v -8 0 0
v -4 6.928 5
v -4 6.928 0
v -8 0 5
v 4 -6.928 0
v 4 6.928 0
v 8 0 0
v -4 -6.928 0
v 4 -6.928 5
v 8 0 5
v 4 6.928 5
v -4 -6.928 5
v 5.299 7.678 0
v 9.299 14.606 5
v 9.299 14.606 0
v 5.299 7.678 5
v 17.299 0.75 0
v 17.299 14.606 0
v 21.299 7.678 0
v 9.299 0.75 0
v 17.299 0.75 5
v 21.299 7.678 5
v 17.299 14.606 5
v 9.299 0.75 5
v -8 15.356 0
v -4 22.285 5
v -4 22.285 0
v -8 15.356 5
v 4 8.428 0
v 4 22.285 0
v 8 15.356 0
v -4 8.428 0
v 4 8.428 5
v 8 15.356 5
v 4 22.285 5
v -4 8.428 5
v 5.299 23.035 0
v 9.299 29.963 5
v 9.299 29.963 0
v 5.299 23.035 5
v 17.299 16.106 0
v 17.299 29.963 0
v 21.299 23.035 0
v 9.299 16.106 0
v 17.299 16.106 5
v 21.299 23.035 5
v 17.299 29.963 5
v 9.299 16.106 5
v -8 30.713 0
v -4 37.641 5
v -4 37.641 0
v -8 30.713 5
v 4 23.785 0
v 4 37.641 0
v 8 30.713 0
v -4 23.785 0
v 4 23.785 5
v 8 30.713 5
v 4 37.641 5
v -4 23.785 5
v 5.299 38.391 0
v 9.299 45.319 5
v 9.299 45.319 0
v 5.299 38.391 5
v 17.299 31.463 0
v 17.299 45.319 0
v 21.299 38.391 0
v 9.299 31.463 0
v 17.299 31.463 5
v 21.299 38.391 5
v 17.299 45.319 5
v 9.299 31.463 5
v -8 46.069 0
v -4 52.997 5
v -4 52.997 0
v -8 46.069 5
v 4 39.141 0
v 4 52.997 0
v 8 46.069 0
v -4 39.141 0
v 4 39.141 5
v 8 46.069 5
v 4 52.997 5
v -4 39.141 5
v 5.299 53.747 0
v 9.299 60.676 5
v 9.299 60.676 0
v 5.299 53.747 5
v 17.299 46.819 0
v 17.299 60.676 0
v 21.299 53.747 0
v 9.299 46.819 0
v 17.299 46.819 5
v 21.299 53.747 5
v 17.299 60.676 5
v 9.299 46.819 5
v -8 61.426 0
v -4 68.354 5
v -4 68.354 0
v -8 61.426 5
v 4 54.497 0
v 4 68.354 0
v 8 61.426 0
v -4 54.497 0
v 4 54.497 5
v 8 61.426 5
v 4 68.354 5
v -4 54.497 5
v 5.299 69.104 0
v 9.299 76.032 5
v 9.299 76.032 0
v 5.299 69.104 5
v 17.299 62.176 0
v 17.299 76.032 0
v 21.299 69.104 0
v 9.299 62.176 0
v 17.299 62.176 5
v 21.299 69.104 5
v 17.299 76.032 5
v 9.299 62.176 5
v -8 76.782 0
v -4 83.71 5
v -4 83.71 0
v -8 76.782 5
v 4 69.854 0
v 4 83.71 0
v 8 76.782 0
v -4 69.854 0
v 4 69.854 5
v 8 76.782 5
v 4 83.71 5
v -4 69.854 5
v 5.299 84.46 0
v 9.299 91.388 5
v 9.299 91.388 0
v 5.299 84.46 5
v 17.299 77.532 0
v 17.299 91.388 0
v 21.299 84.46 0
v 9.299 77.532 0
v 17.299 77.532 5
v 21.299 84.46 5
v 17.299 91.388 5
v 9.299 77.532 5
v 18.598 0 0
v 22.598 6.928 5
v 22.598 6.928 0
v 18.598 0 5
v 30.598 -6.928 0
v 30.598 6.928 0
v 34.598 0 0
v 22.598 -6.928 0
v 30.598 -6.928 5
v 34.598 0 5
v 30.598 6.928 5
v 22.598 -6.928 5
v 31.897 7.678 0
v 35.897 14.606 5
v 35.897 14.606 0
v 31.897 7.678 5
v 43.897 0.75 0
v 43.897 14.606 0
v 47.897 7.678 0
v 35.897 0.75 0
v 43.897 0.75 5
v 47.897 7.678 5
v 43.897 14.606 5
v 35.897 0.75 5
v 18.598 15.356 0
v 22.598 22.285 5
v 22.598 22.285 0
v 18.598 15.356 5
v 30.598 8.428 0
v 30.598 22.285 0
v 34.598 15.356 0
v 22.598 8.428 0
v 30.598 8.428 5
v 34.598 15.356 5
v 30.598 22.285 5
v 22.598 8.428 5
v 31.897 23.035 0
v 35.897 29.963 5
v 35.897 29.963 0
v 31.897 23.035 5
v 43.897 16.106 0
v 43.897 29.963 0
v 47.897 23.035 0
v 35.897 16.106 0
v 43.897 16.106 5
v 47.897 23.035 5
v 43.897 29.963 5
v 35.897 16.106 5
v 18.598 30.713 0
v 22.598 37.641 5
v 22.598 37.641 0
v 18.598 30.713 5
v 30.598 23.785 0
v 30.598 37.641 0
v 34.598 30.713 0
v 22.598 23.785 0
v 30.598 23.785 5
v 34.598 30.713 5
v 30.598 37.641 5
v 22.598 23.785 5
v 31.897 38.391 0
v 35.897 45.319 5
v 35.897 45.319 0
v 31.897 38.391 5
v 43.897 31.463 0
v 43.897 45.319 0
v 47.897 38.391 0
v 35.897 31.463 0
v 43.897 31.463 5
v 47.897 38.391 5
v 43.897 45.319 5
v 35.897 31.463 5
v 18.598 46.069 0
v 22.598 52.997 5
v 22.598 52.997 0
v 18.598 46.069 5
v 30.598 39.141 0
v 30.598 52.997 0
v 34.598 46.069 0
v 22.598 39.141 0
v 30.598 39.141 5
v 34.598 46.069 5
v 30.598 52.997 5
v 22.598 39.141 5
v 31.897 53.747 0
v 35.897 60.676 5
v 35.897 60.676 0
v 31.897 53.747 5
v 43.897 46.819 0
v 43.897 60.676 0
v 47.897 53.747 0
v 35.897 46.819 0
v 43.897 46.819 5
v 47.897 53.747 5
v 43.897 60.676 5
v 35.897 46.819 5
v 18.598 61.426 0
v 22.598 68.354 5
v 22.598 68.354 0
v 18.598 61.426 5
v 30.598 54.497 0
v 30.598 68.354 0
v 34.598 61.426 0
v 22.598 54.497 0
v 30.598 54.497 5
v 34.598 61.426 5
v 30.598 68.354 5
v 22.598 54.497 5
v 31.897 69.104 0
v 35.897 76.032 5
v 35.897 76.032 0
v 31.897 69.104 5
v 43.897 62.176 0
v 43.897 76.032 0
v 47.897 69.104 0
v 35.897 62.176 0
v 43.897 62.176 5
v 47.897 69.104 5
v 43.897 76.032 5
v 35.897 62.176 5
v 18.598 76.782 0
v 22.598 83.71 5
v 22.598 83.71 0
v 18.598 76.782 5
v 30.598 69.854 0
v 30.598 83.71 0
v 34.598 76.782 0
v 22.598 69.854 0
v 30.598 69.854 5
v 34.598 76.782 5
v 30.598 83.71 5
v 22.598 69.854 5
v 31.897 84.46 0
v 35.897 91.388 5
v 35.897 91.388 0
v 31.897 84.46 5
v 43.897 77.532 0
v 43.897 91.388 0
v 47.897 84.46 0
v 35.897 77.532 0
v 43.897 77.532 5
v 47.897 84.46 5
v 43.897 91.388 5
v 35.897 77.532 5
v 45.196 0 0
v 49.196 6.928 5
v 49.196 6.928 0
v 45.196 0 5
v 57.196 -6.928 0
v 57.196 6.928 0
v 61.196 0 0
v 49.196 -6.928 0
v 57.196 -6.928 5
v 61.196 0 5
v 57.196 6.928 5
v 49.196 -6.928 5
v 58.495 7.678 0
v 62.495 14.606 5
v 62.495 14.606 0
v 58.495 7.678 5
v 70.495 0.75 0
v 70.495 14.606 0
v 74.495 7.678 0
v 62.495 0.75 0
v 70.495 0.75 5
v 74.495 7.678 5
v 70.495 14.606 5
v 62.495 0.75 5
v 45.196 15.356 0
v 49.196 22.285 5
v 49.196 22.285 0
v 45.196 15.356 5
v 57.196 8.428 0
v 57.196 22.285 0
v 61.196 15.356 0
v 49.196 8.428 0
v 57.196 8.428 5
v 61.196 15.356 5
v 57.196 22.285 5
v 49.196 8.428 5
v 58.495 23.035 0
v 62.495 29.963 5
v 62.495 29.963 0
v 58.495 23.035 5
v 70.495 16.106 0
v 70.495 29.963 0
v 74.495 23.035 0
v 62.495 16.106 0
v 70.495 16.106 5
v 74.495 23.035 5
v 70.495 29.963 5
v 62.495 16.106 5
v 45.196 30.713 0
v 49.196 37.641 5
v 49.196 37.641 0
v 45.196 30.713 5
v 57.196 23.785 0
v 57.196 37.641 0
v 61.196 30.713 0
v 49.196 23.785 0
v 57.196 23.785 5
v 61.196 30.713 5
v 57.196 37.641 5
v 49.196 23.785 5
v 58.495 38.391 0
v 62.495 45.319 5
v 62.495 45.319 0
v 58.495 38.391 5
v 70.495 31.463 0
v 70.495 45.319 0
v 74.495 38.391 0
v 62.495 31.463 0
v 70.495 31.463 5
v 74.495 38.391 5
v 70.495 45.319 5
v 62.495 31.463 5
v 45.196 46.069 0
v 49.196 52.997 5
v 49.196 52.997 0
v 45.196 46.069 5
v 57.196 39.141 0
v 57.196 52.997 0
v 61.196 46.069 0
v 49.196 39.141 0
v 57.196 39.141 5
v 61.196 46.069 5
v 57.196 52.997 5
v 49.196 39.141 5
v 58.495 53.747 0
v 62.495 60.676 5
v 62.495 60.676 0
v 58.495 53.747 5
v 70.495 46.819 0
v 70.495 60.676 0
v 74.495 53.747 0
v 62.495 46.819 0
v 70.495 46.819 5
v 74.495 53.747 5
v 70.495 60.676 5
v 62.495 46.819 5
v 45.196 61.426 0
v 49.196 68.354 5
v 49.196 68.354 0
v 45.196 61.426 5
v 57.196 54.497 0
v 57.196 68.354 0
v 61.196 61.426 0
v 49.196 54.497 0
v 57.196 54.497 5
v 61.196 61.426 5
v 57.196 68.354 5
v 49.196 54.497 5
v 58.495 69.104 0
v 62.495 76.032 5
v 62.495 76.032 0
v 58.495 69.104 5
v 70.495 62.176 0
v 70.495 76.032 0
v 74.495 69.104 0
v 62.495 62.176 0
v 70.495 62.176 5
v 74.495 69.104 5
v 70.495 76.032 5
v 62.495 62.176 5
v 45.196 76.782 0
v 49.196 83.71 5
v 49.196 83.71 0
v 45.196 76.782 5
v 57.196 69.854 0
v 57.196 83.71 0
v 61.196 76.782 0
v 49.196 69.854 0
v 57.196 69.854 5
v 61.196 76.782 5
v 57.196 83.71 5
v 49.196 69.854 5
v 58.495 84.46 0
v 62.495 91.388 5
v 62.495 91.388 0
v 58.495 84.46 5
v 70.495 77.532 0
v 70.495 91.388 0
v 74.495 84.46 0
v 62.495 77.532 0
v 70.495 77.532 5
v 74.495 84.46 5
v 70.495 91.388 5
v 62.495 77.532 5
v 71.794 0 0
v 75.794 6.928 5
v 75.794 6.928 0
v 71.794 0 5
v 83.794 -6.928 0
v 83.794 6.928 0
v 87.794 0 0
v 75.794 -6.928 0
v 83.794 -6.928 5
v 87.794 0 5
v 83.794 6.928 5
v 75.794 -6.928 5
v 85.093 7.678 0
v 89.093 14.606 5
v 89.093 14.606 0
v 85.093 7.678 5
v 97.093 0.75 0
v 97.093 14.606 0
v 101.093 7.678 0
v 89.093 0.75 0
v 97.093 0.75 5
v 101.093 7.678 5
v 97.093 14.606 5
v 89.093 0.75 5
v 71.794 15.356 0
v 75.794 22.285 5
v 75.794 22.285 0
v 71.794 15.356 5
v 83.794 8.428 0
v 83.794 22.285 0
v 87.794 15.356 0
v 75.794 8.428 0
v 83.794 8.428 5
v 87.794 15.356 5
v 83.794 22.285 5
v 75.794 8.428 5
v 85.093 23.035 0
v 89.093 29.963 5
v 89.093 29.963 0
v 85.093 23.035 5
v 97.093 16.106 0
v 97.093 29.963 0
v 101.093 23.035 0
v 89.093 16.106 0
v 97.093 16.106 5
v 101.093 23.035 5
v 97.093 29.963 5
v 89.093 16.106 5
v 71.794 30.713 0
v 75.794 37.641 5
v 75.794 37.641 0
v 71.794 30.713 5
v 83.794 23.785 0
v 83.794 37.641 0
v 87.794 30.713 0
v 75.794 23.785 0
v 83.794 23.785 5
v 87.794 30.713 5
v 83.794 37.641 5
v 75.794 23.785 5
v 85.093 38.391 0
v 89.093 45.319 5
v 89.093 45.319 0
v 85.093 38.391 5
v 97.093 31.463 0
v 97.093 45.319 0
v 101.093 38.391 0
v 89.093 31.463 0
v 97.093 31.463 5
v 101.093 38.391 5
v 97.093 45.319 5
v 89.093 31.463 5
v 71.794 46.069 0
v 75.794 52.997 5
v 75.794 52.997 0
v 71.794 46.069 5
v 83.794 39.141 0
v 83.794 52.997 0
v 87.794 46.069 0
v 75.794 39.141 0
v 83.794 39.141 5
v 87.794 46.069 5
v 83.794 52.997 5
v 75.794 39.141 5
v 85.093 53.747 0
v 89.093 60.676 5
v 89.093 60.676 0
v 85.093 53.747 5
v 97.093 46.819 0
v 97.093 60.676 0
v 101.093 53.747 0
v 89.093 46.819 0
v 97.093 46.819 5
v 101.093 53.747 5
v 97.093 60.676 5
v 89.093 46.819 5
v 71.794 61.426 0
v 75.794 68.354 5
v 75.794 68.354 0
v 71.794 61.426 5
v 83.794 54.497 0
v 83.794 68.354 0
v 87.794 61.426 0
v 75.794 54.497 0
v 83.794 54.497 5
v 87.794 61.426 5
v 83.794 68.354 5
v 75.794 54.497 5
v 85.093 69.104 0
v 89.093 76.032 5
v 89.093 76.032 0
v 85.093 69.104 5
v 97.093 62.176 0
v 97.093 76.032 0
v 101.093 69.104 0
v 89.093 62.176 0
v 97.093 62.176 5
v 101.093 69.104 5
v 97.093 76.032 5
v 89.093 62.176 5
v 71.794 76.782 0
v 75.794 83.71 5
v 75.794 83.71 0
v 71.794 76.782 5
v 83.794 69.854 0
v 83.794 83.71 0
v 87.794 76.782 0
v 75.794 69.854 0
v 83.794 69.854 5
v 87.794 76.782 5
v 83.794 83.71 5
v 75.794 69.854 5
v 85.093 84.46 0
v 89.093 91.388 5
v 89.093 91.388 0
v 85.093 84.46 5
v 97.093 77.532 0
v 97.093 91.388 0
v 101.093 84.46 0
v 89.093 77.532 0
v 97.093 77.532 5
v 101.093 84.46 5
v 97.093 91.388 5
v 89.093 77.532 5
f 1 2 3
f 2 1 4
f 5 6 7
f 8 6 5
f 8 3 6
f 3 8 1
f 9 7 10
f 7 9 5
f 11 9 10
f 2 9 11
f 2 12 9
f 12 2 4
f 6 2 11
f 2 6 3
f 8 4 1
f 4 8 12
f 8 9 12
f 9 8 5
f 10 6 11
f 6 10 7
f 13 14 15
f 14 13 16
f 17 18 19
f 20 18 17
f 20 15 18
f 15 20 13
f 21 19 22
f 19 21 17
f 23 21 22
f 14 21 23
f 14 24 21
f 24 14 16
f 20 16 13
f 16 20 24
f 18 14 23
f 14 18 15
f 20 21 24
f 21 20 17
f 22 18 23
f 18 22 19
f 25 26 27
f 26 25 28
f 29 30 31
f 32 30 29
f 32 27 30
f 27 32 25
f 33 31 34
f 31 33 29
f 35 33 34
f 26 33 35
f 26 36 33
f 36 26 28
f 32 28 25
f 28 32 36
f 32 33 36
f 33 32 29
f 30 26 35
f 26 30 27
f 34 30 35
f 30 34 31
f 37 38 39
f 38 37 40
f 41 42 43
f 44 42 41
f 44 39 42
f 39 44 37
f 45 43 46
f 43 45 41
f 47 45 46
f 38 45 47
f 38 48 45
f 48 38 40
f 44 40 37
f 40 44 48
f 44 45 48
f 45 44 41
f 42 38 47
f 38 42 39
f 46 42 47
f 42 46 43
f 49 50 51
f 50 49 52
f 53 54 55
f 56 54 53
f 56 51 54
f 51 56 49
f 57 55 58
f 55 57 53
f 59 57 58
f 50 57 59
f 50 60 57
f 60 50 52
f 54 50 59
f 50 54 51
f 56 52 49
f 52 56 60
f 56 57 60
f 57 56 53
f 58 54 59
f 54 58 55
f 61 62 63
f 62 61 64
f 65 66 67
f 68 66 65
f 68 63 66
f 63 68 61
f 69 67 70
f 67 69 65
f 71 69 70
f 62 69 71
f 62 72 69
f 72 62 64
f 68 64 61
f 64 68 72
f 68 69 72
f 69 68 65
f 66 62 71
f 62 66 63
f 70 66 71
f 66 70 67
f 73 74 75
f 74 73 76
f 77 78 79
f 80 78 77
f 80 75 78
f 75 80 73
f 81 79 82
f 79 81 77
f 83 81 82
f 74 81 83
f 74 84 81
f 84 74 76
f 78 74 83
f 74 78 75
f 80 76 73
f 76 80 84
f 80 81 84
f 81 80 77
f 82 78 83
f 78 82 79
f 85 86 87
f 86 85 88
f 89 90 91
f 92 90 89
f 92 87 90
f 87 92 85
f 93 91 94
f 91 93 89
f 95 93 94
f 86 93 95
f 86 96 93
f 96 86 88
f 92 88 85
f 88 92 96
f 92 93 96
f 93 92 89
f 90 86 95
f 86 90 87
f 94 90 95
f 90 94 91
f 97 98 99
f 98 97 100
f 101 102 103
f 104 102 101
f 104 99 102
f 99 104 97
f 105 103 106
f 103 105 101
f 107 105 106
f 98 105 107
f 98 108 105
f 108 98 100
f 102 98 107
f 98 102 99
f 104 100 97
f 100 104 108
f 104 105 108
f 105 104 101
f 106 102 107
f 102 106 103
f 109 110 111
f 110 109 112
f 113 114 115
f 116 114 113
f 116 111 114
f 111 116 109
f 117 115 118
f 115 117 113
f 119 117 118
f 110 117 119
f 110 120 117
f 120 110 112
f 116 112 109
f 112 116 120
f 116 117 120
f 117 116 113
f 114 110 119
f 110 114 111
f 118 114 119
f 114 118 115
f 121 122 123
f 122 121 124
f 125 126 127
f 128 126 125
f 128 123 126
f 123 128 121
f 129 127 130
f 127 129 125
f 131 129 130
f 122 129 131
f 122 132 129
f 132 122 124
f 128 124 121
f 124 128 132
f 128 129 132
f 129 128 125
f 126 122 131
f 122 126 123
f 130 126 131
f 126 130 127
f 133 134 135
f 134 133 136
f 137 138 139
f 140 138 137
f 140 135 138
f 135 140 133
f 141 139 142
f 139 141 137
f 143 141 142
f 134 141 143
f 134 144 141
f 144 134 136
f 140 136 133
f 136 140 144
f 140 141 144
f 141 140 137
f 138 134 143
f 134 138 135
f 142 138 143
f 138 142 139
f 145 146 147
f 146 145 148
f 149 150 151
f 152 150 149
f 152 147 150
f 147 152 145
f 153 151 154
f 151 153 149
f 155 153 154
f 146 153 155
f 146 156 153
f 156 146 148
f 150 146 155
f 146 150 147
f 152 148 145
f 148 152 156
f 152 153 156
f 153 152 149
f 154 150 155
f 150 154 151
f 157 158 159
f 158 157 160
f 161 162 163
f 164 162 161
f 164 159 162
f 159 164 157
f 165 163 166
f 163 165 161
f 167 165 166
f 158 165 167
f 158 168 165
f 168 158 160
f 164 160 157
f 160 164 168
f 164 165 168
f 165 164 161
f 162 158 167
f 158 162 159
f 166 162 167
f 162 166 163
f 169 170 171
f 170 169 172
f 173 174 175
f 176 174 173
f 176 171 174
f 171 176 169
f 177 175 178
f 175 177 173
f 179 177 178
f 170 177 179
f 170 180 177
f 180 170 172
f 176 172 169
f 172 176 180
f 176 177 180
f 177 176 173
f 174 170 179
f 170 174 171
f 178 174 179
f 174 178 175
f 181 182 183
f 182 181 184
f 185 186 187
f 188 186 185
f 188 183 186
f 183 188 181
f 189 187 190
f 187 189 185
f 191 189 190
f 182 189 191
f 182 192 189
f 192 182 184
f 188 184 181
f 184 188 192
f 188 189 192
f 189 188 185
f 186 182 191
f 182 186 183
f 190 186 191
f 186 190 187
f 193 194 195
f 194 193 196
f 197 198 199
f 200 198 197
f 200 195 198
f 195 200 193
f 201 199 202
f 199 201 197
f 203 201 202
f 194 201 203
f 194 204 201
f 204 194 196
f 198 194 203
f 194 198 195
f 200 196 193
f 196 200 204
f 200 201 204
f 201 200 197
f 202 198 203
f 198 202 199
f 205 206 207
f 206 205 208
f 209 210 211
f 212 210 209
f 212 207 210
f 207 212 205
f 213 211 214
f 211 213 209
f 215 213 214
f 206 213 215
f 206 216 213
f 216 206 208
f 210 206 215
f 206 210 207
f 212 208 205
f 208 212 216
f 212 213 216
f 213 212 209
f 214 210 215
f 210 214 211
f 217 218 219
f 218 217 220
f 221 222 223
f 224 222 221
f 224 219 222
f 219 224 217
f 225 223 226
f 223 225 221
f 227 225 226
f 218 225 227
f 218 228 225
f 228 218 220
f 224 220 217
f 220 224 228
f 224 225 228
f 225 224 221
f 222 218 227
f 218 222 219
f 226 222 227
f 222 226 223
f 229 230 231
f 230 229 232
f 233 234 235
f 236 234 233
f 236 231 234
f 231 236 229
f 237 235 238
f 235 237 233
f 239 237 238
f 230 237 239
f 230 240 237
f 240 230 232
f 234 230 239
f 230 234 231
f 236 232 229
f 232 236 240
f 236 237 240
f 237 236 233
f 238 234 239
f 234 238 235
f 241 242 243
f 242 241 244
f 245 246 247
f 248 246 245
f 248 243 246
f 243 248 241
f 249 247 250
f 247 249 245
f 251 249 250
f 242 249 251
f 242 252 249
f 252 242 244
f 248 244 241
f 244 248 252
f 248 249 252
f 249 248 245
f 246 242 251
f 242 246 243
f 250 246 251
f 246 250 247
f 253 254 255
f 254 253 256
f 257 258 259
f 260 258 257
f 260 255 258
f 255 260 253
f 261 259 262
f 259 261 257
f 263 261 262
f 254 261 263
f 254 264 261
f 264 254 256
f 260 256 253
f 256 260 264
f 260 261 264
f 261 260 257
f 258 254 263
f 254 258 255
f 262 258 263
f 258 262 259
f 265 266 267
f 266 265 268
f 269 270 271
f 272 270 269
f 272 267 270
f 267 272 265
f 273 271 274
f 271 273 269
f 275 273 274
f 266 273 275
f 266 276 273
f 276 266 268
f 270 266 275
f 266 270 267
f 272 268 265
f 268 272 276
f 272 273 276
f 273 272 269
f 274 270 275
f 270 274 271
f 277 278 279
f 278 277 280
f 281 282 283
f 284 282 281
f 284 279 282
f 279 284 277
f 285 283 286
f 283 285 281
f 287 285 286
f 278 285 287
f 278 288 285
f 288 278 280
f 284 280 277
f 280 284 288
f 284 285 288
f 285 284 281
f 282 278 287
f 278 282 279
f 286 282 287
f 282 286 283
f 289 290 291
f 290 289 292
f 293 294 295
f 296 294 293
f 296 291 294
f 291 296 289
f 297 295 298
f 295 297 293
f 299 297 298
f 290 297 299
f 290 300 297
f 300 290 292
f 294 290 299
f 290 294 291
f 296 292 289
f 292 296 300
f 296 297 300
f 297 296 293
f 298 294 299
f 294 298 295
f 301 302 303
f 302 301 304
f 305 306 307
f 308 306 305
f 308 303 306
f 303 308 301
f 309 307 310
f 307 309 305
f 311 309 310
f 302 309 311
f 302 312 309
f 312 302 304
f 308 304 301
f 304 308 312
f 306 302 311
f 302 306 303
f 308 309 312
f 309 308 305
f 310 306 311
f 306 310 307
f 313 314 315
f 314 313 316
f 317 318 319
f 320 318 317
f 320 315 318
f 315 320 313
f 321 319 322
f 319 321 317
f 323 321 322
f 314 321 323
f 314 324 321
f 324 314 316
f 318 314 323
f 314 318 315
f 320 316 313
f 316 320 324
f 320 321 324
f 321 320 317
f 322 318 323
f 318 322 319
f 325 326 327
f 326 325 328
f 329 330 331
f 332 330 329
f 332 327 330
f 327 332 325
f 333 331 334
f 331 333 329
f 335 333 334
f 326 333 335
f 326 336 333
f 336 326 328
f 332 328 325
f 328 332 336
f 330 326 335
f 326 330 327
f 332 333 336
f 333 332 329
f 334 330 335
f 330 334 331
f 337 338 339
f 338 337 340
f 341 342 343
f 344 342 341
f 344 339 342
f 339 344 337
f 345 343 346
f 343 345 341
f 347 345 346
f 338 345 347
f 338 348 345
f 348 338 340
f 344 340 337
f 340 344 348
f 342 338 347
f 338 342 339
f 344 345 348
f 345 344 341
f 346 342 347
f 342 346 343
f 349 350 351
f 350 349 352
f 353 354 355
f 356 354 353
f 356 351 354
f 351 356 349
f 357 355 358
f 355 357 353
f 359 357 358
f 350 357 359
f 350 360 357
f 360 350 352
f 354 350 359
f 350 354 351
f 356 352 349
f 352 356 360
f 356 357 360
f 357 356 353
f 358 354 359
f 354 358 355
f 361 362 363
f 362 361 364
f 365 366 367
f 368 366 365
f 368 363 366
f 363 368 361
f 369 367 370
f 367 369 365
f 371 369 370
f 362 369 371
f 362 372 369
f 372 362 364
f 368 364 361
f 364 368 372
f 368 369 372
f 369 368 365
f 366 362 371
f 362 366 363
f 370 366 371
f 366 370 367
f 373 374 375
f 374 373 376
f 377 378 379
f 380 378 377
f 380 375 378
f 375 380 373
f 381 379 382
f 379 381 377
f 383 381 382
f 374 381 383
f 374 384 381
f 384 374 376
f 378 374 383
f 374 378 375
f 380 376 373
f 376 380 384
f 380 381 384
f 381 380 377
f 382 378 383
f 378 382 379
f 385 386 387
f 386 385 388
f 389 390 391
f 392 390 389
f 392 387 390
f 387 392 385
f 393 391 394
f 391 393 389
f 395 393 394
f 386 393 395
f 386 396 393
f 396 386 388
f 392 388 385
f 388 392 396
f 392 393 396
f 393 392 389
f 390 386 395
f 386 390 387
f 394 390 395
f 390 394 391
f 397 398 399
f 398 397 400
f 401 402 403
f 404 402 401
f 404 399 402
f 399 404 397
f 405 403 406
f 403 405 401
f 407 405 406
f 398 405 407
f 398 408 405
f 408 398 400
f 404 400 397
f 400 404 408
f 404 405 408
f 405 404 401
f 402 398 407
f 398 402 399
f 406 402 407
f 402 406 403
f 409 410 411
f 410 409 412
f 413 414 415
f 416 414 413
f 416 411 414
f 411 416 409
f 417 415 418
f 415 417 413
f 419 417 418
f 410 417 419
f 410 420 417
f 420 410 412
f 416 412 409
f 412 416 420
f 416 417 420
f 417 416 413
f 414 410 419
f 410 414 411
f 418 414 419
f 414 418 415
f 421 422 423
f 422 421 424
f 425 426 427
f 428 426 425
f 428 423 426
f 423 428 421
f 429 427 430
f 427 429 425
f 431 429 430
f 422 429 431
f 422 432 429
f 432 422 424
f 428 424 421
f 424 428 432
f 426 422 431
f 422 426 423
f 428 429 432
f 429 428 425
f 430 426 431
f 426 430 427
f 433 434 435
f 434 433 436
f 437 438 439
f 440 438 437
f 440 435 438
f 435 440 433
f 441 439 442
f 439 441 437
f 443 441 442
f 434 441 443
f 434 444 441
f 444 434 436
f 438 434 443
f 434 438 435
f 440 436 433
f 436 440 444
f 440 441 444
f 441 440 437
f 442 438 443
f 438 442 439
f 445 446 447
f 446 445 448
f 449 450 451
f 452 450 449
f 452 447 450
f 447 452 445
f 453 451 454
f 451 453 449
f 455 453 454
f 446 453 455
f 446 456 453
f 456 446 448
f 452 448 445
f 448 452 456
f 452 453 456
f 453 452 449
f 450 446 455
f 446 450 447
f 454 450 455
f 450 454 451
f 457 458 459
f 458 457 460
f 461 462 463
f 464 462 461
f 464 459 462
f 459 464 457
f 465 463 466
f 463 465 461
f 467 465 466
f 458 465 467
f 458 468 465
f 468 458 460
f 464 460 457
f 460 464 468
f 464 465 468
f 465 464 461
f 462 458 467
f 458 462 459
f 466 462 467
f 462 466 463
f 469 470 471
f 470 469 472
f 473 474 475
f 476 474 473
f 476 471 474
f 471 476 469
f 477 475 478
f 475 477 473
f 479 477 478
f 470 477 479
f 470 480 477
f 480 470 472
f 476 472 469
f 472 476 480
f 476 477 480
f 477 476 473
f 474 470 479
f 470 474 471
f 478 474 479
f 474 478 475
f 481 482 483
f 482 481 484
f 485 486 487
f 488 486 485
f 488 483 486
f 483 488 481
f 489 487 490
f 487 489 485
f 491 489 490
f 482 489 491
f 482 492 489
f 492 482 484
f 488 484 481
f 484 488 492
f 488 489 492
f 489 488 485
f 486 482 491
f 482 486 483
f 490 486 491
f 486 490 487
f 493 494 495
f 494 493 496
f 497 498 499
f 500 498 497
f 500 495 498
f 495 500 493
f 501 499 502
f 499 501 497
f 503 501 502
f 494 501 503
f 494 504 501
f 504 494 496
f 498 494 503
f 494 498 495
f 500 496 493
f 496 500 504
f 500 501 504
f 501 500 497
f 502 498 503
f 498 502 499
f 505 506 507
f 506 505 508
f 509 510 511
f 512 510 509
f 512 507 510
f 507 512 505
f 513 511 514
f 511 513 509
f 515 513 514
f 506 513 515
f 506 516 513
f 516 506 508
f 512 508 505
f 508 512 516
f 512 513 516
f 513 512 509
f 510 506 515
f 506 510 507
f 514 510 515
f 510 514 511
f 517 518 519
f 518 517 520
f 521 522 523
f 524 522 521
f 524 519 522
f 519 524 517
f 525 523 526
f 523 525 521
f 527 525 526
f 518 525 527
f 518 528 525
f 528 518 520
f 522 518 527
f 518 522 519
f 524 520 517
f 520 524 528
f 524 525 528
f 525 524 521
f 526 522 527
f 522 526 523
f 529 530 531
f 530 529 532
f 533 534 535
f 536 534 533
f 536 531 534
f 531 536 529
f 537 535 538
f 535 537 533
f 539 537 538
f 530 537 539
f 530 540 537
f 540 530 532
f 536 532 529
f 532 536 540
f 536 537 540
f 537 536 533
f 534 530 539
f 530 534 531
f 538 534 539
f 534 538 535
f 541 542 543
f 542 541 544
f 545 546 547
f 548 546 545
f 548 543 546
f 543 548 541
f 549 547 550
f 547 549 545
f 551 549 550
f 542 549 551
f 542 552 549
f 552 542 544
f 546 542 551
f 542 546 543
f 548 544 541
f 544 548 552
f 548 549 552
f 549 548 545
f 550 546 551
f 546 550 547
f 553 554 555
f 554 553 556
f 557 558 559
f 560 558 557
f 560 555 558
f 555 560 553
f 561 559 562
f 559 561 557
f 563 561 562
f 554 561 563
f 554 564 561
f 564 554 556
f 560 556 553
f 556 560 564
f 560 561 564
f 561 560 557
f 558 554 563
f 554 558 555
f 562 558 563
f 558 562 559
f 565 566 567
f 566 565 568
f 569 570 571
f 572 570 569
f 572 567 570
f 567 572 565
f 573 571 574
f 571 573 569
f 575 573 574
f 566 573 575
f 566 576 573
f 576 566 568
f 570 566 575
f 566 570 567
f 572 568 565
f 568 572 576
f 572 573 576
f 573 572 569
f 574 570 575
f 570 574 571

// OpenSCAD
e = 0.02;

module hexp(h,s) { linear_extrude(height=h) scale(s/2)
    polygon([[2,0],[1,-sqrt(3)],[-1,-sqrt(3)],[-2,0],[-1,sqrt(3)],[1,sqrt(3)]]);
}

module hex(l,w,h,s,t) {
  for (i=[0:3*s+sqrt(3)*t:l+2*s]) for (j=[0:sqrt(3)*s+t:w+s]) {
    translate([i,j,0]) cylinder(h=h, r=s, $fn=6);
    translate([i+(3*s+sqrt(3)*t)/2,j+(sqrt(3)*s+t)/2,0]) cylinder(h=h, r=s, $fn=6);
  }
}

module hex2(l,w,h,s,t) {
  module s() { translate([-e,-t/2,0]) cube([s+t/sqrt(3)+2*e,t,h]); }
  for (i=[0:3*s+sqrt(3)*t:l+2*s]) for (j=[0:sqrt(3)*s+t:w+s]) {
    translate([i,j,0]) { s(); rotate(120) s(); rotate(240) s(); }
    translate([i+(3*s+sqrt(3)*t)/2,j+(sqrt(3)*s+t)/2,0]) { s(); rotate(120) s(); rotate(240) s(); }
  }
}

module hex1(l,w,h,s,t) {
  for (i=[0:3*s+sqrt(3)*t:l+2*s]) for (j=[0:sqrt(3)*s+t:w+s]) {
    translate([i,j,0]) hexp(h,s);
    translate([i+(3*s+sqrt(3)*t)/2,j+(sqrt(3)*s+t)/2,0]) hexp(h,s);
  }
}


hex1(78,78,5,8,1.5);
//hex2(78,78,2,8,1.5);
